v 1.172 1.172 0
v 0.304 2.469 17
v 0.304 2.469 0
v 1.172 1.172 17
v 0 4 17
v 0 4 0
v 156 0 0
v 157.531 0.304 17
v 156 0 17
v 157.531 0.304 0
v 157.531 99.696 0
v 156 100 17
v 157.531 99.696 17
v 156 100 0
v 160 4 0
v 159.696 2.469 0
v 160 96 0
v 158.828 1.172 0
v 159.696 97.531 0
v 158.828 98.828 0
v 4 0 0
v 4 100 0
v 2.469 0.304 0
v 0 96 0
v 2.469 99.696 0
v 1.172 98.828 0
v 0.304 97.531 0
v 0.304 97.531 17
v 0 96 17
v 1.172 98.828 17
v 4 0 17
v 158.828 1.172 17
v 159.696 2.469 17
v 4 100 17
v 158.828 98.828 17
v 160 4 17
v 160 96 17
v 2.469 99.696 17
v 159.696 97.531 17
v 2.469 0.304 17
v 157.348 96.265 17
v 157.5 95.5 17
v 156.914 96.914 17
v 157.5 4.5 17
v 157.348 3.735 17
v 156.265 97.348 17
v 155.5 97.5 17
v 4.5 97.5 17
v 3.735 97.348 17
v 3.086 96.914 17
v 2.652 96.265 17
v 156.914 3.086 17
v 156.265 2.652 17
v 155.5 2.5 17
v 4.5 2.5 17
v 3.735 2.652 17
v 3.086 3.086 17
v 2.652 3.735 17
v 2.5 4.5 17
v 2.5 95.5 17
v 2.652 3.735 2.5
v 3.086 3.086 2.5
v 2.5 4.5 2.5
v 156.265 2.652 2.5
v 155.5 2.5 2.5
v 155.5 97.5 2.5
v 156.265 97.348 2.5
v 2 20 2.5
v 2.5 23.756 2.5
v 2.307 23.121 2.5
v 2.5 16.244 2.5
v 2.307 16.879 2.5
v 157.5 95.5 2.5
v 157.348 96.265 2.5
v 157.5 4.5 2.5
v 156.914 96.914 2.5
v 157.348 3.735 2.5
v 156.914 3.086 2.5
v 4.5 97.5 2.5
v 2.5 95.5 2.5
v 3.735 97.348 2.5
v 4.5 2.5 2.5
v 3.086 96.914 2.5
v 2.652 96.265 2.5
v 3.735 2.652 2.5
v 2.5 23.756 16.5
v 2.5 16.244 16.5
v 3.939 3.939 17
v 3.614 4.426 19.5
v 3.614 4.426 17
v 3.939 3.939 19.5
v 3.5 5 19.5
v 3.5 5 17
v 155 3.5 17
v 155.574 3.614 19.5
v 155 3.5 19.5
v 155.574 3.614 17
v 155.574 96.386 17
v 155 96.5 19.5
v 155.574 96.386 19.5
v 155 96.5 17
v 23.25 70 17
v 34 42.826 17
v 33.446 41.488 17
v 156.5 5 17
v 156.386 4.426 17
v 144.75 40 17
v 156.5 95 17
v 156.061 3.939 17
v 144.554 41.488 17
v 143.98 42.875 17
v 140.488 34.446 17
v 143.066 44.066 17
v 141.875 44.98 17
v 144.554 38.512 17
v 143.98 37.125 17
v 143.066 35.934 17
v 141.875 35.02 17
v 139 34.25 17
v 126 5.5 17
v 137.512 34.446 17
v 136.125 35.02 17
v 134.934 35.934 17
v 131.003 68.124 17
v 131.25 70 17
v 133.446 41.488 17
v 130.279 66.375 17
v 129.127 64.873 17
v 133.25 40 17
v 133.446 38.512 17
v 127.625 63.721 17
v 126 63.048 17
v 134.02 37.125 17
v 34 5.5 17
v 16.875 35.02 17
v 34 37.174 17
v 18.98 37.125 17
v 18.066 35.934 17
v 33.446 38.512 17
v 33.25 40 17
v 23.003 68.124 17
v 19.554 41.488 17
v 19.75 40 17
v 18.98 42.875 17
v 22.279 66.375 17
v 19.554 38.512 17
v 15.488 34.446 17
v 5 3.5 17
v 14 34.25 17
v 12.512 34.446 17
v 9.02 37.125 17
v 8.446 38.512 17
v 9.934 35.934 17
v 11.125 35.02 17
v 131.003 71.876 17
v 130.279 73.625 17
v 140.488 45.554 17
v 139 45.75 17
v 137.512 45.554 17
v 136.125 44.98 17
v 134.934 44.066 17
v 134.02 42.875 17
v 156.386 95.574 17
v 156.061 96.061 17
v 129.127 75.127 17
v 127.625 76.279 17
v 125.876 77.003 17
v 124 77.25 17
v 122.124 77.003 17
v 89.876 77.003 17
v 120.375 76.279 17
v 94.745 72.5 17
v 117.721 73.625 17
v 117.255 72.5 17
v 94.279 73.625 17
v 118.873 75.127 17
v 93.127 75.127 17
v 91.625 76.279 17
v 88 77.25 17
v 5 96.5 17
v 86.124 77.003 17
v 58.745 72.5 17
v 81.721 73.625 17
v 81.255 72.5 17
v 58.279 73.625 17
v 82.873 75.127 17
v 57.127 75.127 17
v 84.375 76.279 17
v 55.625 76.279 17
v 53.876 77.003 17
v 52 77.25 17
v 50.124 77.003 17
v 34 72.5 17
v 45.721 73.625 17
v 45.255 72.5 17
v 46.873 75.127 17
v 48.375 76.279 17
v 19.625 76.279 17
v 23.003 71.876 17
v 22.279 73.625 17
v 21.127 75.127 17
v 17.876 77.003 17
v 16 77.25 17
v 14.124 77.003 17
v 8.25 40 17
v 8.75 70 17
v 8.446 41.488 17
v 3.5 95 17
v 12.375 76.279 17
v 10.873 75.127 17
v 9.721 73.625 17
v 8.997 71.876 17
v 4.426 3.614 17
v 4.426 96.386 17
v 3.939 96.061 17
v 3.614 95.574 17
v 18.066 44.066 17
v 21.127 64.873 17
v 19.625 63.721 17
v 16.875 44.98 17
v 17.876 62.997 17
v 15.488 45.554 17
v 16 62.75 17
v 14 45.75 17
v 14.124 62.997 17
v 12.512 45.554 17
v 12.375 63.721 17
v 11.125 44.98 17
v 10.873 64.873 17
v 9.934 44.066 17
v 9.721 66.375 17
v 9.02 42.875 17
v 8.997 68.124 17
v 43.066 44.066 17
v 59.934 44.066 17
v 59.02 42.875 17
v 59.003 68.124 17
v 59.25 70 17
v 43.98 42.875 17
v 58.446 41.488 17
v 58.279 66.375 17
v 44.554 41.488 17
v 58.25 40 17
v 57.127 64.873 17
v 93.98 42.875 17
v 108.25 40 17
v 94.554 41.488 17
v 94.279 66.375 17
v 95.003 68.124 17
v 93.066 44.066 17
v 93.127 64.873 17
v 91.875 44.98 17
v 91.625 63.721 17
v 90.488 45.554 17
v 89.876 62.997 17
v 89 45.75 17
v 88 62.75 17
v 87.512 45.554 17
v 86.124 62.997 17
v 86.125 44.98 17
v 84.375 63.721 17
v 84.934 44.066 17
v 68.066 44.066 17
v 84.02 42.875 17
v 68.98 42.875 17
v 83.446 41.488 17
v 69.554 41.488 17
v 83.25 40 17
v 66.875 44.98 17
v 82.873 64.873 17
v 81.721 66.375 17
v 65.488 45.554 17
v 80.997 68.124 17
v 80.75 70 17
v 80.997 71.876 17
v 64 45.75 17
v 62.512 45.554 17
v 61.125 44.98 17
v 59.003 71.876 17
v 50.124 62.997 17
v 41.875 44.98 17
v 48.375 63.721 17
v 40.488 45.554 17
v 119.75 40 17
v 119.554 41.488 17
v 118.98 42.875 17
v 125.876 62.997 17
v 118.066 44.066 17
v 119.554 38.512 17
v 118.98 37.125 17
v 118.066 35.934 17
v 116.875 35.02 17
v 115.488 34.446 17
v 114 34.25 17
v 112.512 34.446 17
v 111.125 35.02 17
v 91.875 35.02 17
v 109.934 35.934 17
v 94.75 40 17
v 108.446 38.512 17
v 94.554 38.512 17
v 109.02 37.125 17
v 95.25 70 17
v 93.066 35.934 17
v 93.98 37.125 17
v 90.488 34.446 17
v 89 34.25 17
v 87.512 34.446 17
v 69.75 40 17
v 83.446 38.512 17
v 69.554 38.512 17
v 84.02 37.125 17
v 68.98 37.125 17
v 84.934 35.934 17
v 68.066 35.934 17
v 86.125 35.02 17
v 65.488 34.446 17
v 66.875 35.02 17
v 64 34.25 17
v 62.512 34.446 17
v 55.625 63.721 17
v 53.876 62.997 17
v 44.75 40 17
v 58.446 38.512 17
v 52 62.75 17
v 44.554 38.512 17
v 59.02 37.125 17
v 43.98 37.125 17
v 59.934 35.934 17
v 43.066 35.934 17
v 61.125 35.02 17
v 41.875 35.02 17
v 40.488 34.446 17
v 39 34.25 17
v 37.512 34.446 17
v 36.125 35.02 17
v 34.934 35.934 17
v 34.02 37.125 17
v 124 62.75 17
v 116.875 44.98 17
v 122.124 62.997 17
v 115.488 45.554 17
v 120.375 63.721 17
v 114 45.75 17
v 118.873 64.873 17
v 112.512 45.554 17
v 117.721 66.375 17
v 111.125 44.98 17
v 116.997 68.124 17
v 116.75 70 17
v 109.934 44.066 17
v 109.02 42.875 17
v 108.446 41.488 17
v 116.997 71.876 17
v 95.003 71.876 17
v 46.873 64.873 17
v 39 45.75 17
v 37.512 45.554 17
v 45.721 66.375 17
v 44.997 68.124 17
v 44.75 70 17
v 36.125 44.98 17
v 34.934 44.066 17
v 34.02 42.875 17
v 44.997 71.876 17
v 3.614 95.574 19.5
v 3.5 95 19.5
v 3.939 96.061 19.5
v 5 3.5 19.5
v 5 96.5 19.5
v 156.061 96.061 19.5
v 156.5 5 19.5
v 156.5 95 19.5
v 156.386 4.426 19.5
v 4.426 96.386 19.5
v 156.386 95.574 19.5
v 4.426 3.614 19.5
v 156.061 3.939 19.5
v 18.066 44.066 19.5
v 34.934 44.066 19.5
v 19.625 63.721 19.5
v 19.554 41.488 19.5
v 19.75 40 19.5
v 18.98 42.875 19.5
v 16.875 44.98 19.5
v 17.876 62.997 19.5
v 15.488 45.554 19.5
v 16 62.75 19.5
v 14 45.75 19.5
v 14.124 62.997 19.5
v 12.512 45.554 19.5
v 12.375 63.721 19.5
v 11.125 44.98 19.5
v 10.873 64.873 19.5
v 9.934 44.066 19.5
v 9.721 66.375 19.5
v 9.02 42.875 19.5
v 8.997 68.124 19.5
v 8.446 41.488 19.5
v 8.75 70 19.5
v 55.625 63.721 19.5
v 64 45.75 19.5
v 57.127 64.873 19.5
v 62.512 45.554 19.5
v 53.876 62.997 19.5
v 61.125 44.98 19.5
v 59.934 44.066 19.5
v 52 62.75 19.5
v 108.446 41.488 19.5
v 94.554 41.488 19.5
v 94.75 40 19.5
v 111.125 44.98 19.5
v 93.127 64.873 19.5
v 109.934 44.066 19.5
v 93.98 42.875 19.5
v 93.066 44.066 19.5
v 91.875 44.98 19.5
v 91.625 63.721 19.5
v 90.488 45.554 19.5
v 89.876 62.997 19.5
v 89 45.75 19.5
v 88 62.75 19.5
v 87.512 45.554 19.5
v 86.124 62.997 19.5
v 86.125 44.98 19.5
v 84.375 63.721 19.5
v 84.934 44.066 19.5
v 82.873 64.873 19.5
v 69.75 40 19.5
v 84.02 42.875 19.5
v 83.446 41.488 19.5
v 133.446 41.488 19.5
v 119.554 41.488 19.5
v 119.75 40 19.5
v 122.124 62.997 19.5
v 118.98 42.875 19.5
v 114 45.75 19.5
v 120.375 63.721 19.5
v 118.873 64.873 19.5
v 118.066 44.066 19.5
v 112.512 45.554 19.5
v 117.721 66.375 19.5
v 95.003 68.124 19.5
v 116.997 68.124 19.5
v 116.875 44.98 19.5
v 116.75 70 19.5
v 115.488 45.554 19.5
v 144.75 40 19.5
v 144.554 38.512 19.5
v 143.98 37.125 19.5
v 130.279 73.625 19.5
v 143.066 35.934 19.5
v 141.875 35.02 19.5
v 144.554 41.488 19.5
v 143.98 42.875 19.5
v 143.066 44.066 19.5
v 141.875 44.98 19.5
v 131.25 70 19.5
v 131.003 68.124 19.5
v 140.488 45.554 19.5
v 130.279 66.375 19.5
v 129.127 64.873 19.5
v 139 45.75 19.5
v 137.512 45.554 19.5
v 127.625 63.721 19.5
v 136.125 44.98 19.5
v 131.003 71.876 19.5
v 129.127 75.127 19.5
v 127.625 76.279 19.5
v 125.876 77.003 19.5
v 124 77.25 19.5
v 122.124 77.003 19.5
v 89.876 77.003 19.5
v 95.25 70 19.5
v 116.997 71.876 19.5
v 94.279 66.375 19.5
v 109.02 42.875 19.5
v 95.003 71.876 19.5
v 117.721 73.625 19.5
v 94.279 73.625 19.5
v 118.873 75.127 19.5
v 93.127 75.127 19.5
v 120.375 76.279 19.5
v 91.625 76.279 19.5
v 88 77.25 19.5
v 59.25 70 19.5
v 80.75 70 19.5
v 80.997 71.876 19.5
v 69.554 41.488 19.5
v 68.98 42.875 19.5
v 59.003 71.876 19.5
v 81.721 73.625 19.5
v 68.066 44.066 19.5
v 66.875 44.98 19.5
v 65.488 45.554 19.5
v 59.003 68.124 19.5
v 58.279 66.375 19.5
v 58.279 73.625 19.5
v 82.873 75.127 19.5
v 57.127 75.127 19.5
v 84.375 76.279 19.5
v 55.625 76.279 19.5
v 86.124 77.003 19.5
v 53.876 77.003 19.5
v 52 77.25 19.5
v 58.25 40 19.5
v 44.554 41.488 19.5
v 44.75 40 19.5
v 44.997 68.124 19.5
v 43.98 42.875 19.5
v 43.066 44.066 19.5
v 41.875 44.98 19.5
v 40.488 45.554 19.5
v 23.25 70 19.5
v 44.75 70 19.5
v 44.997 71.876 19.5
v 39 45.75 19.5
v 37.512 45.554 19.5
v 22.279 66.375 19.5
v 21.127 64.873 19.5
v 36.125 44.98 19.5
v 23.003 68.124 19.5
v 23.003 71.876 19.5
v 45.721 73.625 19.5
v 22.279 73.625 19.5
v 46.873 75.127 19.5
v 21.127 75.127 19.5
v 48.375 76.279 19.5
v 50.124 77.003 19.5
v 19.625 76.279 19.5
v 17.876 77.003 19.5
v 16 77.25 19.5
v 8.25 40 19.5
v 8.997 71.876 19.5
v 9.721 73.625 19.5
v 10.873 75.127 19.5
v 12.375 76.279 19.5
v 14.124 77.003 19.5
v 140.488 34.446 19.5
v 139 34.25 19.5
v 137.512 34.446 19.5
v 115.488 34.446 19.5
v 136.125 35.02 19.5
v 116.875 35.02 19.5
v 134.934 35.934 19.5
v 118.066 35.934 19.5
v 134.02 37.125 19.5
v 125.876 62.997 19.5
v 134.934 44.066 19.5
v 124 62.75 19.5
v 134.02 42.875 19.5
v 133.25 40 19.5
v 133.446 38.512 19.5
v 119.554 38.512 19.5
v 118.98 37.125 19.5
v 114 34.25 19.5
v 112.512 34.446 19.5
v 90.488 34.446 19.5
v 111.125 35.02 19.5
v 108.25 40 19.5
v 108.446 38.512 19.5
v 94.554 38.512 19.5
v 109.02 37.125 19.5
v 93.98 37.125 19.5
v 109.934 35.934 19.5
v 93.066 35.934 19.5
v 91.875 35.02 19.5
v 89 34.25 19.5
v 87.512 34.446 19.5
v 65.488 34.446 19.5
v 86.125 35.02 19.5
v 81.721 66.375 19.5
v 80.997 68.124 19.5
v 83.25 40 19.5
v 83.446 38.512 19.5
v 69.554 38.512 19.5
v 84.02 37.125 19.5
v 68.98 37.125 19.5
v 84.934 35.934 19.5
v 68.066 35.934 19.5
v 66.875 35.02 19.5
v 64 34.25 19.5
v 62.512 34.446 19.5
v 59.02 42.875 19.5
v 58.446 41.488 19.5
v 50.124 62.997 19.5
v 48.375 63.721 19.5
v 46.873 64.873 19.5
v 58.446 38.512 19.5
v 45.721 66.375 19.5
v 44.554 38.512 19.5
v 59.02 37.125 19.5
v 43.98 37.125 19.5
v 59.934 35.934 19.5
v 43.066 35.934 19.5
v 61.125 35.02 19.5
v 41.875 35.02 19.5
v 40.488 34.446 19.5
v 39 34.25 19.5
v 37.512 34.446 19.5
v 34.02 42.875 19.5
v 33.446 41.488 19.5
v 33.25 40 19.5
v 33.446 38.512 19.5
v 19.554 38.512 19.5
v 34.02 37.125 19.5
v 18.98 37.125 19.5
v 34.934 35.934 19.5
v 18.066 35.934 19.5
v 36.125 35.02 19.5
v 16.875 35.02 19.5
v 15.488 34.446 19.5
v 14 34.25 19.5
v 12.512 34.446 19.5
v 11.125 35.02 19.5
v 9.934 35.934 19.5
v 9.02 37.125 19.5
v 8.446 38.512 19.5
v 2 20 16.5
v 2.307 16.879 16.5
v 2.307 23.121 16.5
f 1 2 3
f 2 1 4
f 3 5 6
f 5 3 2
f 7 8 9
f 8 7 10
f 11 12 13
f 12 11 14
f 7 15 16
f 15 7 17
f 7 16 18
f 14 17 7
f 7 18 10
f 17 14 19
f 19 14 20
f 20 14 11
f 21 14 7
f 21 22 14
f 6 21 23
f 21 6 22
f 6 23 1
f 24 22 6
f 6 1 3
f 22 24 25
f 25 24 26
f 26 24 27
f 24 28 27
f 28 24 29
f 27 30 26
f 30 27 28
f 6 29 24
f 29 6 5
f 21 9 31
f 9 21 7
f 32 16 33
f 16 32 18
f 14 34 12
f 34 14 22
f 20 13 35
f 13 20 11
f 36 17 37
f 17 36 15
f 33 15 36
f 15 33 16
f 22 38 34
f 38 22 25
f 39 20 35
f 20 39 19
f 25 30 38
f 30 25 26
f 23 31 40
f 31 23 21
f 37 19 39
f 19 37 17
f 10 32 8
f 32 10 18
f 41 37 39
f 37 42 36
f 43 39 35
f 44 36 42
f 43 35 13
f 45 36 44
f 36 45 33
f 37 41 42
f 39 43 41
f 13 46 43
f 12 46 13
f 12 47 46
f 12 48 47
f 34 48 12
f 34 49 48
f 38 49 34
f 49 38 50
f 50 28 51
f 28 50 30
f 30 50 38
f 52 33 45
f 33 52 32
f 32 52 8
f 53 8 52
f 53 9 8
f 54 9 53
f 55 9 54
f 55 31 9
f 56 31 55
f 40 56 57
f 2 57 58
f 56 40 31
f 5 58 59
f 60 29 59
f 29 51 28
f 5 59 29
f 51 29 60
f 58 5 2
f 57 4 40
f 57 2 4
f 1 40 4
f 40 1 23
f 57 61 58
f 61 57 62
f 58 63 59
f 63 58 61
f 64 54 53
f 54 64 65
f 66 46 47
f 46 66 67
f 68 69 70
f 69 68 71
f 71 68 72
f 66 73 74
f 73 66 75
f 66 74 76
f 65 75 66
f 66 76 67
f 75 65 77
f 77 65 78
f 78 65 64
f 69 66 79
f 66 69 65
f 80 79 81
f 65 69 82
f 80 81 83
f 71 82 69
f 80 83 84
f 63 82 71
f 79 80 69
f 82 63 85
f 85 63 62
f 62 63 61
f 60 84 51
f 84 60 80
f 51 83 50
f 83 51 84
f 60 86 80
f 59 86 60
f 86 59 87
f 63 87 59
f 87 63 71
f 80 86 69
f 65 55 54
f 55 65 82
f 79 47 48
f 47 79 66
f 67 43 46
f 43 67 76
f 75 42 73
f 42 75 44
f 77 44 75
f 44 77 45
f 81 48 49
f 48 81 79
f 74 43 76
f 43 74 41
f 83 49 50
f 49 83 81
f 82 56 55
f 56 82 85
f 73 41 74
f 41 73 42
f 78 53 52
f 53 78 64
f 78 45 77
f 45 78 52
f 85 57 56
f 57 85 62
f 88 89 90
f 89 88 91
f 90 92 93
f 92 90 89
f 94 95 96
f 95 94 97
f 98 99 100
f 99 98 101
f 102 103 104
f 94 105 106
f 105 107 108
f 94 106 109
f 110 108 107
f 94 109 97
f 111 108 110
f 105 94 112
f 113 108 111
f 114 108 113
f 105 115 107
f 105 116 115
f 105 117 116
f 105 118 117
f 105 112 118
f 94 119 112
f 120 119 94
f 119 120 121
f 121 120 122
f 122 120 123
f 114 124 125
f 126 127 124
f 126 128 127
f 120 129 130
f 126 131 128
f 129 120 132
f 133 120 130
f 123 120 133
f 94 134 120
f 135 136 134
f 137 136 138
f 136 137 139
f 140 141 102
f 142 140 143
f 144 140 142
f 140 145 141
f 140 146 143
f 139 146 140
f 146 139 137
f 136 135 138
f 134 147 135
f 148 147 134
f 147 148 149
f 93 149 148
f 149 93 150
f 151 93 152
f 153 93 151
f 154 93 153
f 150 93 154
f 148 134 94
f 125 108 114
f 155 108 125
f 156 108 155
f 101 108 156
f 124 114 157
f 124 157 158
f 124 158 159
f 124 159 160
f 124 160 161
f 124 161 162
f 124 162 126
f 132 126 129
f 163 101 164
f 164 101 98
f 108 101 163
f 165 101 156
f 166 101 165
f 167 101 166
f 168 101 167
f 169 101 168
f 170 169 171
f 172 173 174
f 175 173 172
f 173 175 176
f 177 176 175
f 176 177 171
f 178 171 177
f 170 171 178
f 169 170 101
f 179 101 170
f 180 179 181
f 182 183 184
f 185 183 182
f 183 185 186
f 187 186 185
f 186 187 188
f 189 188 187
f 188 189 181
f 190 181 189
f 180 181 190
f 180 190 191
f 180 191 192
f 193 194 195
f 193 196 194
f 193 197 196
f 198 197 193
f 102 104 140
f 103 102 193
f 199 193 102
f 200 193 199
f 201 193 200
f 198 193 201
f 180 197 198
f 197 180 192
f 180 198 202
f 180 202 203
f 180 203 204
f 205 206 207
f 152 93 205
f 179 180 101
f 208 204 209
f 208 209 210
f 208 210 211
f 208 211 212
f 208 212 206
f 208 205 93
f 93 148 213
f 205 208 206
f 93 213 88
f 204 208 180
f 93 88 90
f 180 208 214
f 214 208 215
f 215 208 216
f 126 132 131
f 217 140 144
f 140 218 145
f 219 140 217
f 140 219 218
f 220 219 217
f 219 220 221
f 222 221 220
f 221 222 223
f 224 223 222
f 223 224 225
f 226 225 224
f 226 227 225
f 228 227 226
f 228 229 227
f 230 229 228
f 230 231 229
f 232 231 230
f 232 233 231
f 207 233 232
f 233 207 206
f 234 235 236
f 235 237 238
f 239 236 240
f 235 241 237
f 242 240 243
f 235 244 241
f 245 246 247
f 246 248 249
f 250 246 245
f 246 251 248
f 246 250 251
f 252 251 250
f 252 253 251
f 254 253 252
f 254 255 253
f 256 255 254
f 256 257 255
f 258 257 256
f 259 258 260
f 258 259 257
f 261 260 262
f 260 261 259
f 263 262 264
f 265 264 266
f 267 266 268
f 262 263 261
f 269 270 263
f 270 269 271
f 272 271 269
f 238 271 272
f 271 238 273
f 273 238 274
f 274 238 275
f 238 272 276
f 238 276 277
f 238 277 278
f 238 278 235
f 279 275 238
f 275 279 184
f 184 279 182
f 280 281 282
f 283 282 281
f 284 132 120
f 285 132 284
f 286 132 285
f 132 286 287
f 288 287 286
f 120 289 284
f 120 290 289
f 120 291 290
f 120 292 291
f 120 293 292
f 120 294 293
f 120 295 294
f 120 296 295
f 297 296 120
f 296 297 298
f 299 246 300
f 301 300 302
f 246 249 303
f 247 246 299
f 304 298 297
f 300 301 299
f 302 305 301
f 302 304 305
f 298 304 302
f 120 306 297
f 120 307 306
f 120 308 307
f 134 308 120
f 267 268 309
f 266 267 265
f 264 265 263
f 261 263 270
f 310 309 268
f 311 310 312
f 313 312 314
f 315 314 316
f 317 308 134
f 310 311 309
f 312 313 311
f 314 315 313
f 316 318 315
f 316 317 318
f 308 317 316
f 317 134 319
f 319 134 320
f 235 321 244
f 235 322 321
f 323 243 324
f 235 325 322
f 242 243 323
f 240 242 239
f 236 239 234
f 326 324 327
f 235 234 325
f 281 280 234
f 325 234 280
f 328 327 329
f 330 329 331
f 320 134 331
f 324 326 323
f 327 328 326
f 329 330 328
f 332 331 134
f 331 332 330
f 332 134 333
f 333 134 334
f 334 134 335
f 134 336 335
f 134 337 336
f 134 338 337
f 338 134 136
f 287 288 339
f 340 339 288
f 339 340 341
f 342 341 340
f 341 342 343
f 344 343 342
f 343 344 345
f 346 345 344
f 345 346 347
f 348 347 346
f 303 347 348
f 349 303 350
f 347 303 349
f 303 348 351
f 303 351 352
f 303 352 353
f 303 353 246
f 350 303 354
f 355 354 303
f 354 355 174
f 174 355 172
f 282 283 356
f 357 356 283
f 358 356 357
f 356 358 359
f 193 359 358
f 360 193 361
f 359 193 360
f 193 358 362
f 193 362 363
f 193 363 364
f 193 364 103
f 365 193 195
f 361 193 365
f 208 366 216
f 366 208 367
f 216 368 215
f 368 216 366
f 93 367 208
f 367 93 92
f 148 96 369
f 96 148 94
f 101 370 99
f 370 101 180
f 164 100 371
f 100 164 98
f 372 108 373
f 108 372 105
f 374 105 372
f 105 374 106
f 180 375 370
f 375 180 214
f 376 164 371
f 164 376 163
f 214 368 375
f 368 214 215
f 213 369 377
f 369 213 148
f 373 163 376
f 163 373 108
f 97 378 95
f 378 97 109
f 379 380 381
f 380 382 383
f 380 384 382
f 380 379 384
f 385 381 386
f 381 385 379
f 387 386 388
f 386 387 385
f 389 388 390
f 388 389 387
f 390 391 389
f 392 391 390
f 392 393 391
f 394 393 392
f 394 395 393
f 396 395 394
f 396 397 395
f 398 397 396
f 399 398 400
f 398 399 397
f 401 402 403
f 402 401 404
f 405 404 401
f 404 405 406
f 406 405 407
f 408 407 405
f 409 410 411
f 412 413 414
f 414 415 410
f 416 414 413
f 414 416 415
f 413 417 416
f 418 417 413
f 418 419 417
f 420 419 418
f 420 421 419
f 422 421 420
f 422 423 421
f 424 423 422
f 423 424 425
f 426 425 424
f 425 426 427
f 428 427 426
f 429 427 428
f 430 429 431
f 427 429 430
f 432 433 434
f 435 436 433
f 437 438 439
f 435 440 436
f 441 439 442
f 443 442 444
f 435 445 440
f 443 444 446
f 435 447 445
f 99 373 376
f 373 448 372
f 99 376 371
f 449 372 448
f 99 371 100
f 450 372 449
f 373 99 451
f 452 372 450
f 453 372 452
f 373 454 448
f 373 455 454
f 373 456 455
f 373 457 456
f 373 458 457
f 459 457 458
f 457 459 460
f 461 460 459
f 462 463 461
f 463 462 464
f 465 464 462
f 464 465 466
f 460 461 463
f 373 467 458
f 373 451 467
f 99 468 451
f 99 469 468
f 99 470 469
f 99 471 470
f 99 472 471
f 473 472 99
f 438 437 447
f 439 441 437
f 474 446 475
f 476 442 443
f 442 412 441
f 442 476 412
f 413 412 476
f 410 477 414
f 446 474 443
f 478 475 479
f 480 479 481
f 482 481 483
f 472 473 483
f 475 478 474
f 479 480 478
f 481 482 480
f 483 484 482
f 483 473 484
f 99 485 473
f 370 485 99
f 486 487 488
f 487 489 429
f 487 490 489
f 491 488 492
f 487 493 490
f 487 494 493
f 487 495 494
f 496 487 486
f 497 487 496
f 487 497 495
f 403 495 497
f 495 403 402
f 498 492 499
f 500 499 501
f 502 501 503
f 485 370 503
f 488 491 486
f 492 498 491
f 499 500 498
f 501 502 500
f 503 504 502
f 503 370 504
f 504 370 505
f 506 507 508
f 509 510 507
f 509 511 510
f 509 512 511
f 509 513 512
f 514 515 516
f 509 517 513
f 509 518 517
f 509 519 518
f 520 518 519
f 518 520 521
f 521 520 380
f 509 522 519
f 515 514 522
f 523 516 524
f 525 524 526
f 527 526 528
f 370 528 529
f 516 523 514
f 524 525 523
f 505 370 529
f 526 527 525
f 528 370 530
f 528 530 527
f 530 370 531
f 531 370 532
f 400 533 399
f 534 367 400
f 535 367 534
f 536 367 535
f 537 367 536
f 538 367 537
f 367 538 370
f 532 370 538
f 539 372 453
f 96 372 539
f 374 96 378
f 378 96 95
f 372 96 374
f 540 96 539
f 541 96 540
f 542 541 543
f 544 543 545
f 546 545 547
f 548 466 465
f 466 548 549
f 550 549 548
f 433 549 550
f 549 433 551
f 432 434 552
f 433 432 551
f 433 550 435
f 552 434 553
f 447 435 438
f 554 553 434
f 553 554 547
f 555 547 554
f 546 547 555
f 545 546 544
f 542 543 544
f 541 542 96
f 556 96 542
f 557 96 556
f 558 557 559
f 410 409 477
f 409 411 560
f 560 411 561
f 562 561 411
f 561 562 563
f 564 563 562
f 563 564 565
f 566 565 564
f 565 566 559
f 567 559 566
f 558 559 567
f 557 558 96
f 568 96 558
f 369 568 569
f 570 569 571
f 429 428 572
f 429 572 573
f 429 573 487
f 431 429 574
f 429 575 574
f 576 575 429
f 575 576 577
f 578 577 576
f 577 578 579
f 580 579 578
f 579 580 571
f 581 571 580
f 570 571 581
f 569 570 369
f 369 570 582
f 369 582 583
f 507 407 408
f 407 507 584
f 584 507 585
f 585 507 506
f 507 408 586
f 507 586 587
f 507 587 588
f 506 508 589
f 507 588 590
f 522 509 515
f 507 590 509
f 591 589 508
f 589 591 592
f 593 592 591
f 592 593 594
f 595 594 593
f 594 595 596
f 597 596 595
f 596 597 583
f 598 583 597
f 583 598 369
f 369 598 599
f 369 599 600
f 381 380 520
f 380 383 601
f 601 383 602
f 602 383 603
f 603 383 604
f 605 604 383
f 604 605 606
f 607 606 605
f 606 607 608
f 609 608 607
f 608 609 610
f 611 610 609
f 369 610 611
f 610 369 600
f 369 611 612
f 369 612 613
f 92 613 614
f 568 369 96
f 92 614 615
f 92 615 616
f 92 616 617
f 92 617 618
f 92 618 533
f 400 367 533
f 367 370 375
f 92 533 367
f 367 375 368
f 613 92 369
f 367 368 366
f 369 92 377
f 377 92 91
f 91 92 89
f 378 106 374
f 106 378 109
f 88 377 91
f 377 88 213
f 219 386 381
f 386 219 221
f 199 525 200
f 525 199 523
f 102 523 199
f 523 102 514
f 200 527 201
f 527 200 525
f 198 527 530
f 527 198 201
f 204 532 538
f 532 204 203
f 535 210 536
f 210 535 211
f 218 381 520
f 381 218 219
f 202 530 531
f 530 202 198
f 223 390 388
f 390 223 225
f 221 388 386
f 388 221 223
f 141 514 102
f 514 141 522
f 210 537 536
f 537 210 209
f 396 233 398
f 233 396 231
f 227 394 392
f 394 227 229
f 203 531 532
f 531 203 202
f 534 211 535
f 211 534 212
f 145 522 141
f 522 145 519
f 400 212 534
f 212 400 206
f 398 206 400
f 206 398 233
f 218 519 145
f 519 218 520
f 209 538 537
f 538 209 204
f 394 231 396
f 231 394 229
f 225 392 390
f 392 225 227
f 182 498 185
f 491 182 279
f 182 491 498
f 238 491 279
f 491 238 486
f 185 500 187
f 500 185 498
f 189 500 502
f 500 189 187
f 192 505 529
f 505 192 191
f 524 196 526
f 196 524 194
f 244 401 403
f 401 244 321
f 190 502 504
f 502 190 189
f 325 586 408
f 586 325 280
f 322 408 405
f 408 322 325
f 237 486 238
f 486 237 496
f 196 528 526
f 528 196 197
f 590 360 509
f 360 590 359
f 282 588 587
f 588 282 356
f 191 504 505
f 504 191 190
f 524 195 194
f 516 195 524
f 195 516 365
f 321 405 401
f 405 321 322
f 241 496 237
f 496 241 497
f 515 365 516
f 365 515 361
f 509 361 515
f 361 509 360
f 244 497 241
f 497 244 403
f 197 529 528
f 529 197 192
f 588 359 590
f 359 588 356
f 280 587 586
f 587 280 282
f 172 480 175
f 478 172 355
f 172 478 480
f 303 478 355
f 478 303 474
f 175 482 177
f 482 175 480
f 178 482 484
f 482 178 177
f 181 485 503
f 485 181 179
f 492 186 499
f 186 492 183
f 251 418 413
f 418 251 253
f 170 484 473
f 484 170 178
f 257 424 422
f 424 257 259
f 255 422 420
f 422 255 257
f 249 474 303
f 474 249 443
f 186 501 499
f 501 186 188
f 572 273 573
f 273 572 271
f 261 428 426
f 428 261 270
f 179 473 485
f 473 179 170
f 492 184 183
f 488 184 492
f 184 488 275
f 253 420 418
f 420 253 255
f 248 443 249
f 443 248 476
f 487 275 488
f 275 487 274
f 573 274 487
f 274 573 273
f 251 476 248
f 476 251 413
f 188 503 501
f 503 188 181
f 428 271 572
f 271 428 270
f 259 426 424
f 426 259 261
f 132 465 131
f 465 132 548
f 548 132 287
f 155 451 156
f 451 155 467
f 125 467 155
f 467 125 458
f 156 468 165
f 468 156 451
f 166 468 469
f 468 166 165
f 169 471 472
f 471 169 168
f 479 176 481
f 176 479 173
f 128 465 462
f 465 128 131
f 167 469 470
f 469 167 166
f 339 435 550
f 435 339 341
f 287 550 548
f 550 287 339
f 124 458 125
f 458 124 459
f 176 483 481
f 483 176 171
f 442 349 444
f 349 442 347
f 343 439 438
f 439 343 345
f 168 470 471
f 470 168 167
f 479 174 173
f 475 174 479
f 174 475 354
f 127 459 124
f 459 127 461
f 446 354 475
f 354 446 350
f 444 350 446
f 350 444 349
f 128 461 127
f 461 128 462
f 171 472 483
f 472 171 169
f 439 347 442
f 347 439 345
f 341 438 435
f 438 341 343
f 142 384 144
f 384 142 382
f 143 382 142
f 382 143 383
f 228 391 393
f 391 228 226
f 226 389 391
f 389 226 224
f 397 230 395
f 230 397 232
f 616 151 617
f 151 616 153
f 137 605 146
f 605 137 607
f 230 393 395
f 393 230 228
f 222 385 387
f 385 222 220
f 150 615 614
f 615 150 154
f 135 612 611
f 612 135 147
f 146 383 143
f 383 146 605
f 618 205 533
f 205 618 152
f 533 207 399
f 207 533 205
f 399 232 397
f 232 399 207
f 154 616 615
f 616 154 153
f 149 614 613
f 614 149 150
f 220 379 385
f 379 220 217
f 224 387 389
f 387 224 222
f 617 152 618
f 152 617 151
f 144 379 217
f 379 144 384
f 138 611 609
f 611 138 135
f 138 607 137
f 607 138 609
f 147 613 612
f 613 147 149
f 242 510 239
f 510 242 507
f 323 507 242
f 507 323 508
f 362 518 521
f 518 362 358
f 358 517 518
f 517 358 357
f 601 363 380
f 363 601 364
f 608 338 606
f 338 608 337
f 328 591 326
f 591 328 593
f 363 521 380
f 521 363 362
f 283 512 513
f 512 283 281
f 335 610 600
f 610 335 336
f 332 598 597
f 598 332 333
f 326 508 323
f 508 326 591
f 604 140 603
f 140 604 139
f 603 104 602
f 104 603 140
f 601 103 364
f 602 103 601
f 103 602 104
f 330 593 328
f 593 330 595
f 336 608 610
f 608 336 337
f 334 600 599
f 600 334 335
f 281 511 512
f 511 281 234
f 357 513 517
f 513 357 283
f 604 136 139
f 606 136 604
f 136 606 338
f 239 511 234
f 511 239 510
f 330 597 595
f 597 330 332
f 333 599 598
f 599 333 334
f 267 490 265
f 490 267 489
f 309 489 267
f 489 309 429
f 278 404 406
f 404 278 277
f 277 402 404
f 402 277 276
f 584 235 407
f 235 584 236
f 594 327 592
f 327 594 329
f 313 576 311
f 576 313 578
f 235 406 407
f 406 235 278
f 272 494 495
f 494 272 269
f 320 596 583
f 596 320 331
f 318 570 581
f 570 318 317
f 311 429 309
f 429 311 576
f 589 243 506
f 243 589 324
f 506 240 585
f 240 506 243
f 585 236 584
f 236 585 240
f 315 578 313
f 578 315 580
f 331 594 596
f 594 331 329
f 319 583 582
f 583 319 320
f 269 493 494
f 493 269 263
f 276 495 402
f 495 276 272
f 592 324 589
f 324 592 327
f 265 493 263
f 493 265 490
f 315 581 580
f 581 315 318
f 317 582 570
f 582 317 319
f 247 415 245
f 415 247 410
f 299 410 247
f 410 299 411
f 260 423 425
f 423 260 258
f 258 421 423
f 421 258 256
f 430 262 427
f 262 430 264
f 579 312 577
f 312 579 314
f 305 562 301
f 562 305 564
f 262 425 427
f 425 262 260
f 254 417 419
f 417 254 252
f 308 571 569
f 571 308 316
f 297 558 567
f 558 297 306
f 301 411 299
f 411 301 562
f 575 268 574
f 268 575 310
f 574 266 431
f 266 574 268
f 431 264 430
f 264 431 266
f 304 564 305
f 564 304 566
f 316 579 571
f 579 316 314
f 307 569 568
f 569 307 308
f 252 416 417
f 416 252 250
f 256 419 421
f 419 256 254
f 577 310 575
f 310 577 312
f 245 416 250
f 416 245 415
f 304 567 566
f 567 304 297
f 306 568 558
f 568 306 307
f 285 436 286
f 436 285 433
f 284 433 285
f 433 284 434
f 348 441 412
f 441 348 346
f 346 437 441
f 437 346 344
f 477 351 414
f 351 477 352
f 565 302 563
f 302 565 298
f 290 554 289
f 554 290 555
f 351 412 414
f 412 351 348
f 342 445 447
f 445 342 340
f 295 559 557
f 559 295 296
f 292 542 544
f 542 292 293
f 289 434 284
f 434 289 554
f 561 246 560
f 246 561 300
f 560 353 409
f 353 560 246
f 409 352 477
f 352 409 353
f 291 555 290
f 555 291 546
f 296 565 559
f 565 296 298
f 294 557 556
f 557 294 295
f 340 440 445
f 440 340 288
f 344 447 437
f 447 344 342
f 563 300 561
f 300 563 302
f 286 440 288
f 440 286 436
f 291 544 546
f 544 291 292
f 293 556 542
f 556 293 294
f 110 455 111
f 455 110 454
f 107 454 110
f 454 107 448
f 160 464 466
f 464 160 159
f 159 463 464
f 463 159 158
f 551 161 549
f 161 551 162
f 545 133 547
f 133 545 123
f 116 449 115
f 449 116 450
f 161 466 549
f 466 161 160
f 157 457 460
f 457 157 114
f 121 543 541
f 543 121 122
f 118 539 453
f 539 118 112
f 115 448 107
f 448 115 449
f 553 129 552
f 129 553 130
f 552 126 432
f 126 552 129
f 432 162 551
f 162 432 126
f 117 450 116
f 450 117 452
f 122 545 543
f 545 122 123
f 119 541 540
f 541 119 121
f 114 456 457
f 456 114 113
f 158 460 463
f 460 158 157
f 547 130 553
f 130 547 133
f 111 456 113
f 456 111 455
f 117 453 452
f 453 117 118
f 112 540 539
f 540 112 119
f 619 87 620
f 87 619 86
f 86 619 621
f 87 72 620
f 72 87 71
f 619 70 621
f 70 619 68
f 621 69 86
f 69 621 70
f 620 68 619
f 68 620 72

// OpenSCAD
/**
 * solt_kit_case.scad — TM-CAL-ENC-003 Rev A
 * SOLT Calibration Kit Case
 *
 * Holds:
 *   - 4× SMA(M) calibration standards (SHORT, OPEN, LOAD, THRU)
 *   - 6× SMA inline attenuator pads (3/6/10/20/30/40 dB)
 *   - 2× SMA-SMA barrel adapters
 *   - 2× BNC-SMA adapters
 *   - 3× SMA cables (150mm)
 *   - 1× Laminated calibration reference card
 *
 * Design: hinged clamshell, foam-lined interior, label window on lid
 * Envelope: 160×100×35 mm (two halves: 160×100×17.5 each)
 */

// ── Parameters ──────────────────────────────────────────────────────────────
box_w  = 160.0;
box_d  = 100.0;
half_h = 17.0;   // each half height
wall   = 2.5;
hinge_d = 4.0;
hinge_pin_d = 2.5;
r      = 4.0;
$fn    = 32;

// SMA standard pocket: 14mm dia × 22mm deep
std_d  = 14.5;
std_h  = 23.0;

// Attenuator module pocket: 11mm dia × 18mm deep (SMA-SMA in-line style)
att_d  = 11.5;
att_h  = 18.0;

// Cable coil pocket (Ø30mm × 12mm deep for 150mm cable coiled)
cable_d = 32.0;
cable_h = 13.0;

// Card pocket: 90mm × 65mm × 2mm
card_w  = 92.0;
card_d  = 67.0;
card_h  = 2.5;

// Label window in lid
label_w = 80.0;
label_d = 40.0;

// Latch (simple over-center snap on front edge)
latch_w = 30.0;
latch_h = 6.0;

module rounded_box_2d(w, d, r_) {
    hull()
        for (x=[r_, w-r_]) for (y=[r_, d-r_])
            translate([x, y, 0]) circle(r=r_, $fn=16);
}

module half_shell() {
    difference() {
        // Outer shell
        linear_extrude(half_h)
            rounded_box_2d(box_w, box_d, r);
        // Interior pocket
        translate([wall, wall, wall])
            linear_extrude(half_h)
                rounded_box_2d(box_w-2*wall, box_d-2*wall, r-wall+0.5);
    }
}

// ── Bottom Half (contains all component pockets) ───────────────────────────
module bottom_half() {
    difference() {
        union() {
            half_shell();
            // Lip for clamshell alignment
            translate([wall+1, wall+1, half_h])
                linear_extrude(2.5)
                    rounded_box_2d(box_w-2*(wall+1), box_d-2*(wall+1), r-wall);
        }

        // ── SMA STANDARD POCKETS (4× row at back) ─────────────────────
        for (i=[0:3])
            translate([16 + i*36, box_d-30, wall])
                cylinder(h=std_h+1, d=std_d, $fn=24);

        // Label recess inside each standard pocket (engraved marker ring)
        // Colors: RED=SHORT, GREEN=OPEN, BLUE=LOAD, NATURAL=THRU
        // Label text embossed on exterior of pocket lip:
        for (i=[0:3]) {
            translate([16 + i*36, box_d-30, wall + std_h - 2])
                cylinder(h=2.5, d=std_d+3, $fn=24);  // recess ring for ID band
        }

        // ── ATTENUATOR POCKETS (6× row in middle) ─────────────────────
        for (i=[0:5])
            translate([14 + i*25, box_d-60, wall])
                cylinder(h=att_h+1, d=att_d, $fn=24);

        // ── CABLE COIL POCKETS (3× left area) ─────────────────────────
        for (i=[0:2])
            translate([18 + i*36, 20, wall])
                cylinder(h=cable_h+1, d=cable_d, $fn=32);

        // ── ADAPTER POCKET (BNC-SMA, SMA-SMA: 2× each) ────────────────
        translate([130, 15, wall])
            cube([25, 15, 10]);
        translate([130, 35, wall])
            cube([25, 15, 10]);

        // ── CARD SLOT (right side, shallow) ───────────────────────────
        translate([(box_w - card_w)/2, wall + 3, half_h - card_h - 1])
            cube([card_w, card_d, card_h + 1]);
    }
}

// ── Top Half (lid) ─────────────────────────────────────────────────────────
module top_half() {
    difference() {
        half_shell();
        // Receive the lip from bottom half
        translate([wall+1+0.4, wall+1+0.4, 0])
            linear_extrude(2.8)
                rounded_box_2d(box_w-2*(wall+1)-0.8, box_d-2*(wall+1)-0.8, r-wall-0.3);
        // Label window
        translate([(box_w-label_w)/2, (box_d-label_d)/2, half_h-1.5])
            cube([label_w, label_d, 2]);
    }
    // Raised label text inside window
    translate([(box_w-label_w)/2+4, (box_d-label_d)/2+6, half_h-1.0])
        linear_extrude(1.2)
            text("SOLT CAL KIT", size=6, font="Liberation Sans:style=Bold");
    translate([(box_w-label_w)/2+4, (box_d-label_d)/2+16, half_h-1.0])
        linear_extrude(1.2)
            text("SHORT  OPEN  LOAD  THRU", size=4, font="Liberation Mono");
}

// ── Pocket label tabs (print separately; press-fit into pocket lip) ─────────
module std_label(txt, col) {
    // Small disc that sits on top of each pocket
    difference() {
        cylinder(h=3, d=std_d+2, $fn=24);
        cylinder(h=3.5, d=std_d, $fn=24);  // hollow center
    }
    translate([-std_d/2+1, -2, 0])
        linear_extrude(3.5)
            text(txt, size=4, font="Liberation Sans:style=Bold");
}

// ── Render ─────────────────────────────────────────────────────────────────
print_part = "bottom";  // "bottom" | "top" | "labels"

if (print_part == "bottom") {
    color("sandybrown", 0.9) bottom_half();
} else if (print_part == "top") {
    color("peru", 0.9) top_half();
} else {
    // Print 4 label rings (filament change for color would be ideal)
    color("red",   0.9) translate([0, 0, 0])  std_label("S", "red");
    color("green", 0.9) translate([20, 0, 0]) std_label("O", "green");
    color("blue",  0.9) translate([40, 0, 0]) std_label("L", "blue");
    color("gray",  0.9) translate([60, 0, 0]) std_label("T", "gray");
}

// ── Assembly Notes ──────────────────────────────────────────────────────────
// 1. Print bottom_half and top_half in ASA or PETG (durable, field use).
// 2. Cut foam inserts (craft foam or packaging foam):
//    - 3mm base layer for cable coil pockets
//    - Thin ring pads for attenuator pockets
//    Standards pockets and cable pockets do not need foam (snug fit designed in).
// 3. Construct SOLT standards (see TM-CAL-SCH-005 for construction details):
//    SHORT: solder center pin to GND inside SMA(M)
//    OPEN:  leave center pin open; seal with hot glue to prevent contamination
//    LOAD:  2× 100Ω 0402 in parallel between center and GND
//    THRU:  SMA(M)-SMA(M) barrel adapter (purchase)
// 4. Mark each standard with colored dot (nail polish or paint):
//    RED = SHORT, GREEN = OPEN, BLUE = LOAD, no mark = THRU
// 5. Print label rings (labels option) in matching colors if multi-filament
//    printer available; otherwise use adhesive colored labels.
// 6. Laminate CAL_CARD reference sheet (see manual Appendix D) and store in slot.
// 7. Snap lid closed; test latching. Add velcro strip on front edge if snap
//    is insufficient.
